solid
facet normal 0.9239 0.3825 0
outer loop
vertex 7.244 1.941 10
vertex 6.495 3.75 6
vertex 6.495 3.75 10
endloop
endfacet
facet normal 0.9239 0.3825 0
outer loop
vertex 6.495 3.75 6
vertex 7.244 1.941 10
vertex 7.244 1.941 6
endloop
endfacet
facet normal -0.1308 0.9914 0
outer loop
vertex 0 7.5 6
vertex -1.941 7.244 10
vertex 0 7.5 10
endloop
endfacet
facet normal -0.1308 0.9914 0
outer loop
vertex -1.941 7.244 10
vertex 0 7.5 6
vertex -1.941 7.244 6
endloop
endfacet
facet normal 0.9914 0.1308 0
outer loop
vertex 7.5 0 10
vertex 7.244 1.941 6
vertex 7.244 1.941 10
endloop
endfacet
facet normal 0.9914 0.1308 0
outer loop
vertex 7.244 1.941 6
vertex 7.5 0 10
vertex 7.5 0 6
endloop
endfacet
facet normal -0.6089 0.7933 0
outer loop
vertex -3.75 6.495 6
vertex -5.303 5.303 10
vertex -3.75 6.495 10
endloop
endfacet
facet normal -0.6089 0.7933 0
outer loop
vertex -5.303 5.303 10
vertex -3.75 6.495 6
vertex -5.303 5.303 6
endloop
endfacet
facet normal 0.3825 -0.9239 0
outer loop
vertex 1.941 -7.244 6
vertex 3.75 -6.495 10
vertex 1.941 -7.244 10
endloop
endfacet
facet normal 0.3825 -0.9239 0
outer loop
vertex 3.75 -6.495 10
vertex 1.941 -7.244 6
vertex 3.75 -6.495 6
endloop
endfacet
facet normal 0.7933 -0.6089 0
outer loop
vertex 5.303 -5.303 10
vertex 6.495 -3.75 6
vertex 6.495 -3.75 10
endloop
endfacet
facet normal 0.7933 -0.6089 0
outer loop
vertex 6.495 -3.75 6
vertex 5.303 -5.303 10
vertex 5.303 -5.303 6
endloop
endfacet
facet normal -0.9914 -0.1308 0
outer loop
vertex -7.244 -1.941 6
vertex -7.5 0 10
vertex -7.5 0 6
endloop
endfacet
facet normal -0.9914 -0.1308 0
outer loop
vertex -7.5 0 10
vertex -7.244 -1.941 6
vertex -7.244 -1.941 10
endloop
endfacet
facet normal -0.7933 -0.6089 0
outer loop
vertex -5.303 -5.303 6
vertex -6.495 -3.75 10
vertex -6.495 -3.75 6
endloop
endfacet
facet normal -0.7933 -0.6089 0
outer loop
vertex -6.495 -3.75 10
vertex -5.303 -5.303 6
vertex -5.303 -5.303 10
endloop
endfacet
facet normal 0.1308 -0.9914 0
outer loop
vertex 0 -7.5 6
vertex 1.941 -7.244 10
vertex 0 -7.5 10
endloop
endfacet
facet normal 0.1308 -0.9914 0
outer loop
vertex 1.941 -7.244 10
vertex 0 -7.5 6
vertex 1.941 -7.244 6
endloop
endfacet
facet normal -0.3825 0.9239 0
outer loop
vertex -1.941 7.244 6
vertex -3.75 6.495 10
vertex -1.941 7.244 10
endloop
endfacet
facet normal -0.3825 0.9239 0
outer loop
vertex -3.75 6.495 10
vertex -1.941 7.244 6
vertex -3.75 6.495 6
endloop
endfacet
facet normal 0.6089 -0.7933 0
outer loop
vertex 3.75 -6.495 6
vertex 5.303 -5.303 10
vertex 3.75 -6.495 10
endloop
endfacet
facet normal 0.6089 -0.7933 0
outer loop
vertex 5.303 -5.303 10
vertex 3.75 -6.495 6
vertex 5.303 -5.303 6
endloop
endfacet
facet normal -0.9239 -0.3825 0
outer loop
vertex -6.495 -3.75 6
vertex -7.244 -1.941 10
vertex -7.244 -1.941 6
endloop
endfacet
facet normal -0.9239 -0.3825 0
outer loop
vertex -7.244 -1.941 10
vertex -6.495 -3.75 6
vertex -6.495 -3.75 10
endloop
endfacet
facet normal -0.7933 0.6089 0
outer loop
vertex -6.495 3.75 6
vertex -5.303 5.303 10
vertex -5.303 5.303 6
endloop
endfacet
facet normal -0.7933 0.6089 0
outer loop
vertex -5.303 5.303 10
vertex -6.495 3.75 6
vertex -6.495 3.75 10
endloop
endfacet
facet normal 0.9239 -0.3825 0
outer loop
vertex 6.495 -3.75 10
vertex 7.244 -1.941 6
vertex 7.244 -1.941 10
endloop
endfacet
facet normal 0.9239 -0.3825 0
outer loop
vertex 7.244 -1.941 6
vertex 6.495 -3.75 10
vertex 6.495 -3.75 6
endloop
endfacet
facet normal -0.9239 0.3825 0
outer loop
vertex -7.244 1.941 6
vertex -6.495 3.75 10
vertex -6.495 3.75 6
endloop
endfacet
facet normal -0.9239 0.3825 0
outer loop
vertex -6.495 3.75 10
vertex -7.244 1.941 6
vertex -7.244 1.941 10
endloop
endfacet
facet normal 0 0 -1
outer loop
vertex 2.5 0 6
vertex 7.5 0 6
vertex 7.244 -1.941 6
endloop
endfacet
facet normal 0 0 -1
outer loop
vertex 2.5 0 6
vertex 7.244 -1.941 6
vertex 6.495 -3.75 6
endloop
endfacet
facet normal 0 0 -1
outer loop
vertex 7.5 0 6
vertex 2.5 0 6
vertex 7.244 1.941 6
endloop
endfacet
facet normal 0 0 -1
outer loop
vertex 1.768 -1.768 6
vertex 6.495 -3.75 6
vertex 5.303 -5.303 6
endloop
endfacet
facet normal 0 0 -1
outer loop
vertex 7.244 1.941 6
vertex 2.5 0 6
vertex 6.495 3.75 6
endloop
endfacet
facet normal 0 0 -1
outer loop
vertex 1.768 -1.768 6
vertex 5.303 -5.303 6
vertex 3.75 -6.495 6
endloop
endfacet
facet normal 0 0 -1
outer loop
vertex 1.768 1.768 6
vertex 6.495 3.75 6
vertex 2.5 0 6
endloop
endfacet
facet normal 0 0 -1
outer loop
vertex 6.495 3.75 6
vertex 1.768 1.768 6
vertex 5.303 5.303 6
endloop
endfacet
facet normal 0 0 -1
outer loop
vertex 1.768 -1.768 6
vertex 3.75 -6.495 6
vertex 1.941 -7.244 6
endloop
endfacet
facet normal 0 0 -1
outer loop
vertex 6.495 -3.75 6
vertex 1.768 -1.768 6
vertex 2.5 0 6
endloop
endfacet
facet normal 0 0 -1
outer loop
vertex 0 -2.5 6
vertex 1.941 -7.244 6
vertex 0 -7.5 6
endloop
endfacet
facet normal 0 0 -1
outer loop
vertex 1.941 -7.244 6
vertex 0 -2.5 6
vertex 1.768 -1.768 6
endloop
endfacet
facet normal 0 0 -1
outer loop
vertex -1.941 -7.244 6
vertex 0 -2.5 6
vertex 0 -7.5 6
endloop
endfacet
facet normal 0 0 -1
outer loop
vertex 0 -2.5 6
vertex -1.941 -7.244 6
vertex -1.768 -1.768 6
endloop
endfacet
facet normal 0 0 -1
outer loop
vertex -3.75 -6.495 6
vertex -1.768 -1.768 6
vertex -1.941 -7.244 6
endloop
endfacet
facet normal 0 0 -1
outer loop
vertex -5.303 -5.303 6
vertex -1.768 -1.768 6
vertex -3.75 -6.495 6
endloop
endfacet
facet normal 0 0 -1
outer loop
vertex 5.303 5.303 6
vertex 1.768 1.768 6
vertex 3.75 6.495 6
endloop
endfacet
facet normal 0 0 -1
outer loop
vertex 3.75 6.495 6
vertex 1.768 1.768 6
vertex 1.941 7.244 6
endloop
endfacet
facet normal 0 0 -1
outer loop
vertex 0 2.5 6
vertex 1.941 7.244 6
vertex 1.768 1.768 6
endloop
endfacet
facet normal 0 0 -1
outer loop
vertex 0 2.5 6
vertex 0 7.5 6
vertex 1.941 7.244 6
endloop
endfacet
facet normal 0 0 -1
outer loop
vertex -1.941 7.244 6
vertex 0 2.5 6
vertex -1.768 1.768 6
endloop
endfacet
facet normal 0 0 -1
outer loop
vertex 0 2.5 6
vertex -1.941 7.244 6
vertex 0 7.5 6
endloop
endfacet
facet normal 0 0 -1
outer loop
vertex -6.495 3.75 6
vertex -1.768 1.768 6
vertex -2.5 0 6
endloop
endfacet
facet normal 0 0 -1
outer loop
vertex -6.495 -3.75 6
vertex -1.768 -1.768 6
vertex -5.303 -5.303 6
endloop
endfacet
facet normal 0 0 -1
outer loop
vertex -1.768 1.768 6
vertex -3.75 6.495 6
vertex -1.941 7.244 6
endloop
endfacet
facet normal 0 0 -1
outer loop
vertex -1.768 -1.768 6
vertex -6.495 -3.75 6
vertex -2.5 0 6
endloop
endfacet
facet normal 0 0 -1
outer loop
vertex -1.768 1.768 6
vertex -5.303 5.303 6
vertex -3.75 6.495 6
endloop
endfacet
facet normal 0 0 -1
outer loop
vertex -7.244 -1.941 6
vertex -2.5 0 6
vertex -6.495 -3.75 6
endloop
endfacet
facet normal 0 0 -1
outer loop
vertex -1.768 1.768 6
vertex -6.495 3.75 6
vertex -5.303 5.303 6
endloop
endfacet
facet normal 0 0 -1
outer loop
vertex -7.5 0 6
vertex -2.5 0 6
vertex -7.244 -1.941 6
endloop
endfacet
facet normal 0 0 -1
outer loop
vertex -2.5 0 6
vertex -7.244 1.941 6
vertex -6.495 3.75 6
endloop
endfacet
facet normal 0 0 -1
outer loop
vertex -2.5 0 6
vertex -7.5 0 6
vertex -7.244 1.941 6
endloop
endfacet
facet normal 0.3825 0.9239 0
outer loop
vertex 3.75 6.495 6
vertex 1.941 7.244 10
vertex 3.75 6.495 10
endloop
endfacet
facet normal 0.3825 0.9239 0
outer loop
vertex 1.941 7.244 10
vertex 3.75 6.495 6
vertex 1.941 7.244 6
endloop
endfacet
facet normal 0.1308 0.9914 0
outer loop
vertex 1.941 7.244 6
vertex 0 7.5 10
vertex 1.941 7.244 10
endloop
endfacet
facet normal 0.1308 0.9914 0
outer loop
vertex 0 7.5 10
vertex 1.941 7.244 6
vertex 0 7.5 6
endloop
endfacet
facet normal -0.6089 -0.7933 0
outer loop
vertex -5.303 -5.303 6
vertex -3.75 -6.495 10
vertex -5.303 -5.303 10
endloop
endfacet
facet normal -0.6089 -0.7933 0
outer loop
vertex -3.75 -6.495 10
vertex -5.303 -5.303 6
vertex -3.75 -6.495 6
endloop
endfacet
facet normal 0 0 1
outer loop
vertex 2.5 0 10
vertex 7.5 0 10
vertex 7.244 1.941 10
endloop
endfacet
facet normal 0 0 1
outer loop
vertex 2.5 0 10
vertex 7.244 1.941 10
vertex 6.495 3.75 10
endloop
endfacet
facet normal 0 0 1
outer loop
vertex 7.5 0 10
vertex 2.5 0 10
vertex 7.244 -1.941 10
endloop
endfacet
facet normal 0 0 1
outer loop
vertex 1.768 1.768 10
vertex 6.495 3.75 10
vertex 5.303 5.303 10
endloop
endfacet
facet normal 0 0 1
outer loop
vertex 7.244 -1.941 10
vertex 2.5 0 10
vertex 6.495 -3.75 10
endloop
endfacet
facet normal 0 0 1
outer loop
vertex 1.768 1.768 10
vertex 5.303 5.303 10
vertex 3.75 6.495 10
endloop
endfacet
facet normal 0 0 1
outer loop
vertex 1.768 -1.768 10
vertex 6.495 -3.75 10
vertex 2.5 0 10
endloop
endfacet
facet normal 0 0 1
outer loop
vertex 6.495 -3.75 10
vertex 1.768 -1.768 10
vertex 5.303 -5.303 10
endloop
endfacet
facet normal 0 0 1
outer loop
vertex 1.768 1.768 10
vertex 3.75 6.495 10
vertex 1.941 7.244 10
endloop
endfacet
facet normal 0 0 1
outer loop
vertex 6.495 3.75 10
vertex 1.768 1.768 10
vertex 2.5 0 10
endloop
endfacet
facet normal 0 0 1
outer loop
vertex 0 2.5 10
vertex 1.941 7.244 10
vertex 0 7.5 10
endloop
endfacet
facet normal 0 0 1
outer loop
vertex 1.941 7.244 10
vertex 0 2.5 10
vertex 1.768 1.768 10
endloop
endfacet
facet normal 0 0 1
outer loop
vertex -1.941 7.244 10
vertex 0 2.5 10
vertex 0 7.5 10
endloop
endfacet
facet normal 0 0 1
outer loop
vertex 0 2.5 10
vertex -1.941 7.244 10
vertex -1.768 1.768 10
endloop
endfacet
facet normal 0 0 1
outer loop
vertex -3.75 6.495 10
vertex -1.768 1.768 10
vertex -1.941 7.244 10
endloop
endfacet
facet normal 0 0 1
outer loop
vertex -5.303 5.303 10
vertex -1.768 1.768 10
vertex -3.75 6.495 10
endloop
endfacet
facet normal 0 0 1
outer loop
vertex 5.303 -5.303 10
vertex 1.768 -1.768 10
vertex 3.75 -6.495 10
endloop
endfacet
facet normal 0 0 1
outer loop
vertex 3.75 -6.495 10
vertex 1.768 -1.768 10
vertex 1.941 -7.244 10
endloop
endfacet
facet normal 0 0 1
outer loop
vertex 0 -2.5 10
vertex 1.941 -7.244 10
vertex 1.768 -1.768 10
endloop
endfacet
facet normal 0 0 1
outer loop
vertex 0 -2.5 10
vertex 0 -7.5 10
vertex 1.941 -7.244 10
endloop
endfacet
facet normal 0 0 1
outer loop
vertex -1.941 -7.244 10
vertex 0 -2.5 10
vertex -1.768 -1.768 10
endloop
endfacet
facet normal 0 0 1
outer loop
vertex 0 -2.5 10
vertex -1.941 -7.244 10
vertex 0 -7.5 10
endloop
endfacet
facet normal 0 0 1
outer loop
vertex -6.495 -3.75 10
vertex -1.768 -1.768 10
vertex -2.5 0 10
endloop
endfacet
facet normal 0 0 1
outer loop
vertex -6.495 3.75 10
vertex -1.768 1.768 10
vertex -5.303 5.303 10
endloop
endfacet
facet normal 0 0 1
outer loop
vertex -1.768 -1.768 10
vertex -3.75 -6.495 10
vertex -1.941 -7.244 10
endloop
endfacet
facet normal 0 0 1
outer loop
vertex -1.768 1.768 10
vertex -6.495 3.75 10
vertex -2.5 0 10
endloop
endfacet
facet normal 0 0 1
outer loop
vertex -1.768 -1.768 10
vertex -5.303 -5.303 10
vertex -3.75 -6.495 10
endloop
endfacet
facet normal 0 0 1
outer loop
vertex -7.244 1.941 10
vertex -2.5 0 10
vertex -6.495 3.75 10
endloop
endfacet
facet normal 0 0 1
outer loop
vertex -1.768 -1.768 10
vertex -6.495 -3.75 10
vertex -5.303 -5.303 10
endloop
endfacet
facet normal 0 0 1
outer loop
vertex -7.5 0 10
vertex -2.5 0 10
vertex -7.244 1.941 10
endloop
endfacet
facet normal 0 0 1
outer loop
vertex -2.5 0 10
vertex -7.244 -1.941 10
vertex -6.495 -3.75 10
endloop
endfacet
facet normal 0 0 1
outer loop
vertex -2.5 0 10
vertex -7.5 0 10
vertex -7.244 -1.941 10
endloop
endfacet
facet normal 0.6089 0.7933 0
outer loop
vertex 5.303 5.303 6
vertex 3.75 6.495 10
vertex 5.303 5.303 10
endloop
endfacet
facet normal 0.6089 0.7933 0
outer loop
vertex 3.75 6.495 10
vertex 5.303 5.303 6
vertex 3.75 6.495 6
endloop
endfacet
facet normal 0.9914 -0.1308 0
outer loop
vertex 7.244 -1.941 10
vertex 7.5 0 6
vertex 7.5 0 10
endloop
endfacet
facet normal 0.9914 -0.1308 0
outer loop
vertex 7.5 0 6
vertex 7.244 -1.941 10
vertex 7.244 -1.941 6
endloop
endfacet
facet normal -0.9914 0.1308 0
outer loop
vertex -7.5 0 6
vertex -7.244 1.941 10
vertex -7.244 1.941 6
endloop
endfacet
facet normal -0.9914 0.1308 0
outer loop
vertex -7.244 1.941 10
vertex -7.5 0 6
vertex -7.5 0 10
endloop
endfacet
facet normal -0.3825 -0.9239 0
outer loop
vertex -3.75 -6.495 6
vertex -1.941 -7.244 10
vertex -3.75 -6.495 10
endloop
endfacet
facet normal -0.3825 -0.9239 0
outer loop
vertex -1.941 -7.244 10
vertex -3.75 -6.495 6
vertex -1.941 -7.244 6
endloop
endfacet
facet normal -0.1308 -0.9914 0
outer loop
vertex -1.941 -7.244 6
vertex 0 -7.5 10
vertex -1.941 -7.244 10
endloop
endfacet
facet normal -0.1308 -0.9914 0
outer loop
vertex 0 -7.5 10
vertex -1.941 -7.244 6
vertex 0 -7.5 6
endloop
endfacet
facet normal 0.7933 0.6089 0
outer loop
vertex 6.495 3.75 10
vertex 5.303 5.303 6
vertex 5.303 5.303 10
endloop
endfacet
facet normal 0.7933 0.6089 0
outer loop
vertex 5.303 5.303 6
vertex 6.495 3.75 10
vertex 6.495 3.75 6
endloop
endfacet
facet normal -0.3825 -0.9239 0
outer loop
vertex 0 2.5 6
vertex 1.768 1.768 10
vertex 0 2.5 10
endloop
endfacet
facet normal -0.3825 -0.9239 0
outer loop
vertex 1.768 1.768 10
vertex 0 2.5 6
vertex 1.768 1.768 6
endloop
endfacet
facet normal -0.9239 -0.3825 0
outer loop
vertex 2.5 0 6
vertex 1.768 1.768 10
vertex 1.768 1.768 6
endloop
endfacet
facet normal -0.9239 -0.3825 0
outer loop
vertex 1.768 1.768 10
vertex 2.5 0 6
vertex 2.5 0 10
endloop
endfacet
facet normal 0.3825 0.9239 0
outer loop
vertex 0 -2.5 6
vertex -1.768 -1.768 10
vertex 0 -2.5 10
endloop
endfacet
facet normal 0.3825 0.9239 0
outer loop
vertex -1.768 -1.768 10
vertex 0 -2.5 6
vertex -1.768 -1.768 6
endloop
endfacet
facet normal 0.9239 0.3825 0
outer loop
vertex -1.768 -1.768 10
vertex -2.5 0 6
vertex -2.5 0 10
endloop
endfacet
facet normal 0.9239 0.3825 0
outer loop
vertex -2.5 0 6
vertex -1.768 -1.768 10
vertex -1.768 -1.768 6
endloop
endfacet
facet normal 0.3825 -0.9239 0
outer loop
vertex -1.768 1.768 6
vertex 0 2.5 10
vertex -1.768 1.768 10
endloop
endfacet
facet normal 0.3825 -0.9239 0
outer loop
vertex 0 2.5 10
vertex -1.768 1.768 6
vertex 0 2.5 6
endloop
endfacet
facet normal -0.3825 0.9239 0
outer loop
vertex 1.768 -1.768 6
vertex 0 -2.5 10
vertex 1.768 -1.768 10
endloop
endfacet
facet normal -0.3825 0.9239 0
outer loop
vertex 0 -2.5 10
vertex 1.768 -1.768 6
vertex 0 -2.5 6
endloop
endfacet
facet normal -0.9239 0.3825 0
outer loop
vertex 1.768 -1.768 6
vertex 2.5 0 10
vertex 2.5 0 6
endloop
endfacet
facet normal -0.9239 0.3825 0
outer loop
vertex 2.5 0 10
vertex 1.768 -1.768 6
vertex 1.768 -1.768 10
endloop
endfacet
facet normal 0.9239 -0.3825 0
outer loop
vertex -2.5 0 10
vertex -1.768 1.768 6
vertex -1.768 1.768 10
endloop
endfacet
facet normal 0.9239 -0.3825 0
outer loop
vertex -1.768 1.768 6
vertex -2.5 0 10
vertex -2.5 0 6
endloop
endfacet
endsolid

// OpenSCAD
use <MCAD/involute_gears.scad>

gear(
  number_of_teeth = 12,
  circular_pitch = 8,
  gear_thickness = 6,
  bore_diameter = 5
);
